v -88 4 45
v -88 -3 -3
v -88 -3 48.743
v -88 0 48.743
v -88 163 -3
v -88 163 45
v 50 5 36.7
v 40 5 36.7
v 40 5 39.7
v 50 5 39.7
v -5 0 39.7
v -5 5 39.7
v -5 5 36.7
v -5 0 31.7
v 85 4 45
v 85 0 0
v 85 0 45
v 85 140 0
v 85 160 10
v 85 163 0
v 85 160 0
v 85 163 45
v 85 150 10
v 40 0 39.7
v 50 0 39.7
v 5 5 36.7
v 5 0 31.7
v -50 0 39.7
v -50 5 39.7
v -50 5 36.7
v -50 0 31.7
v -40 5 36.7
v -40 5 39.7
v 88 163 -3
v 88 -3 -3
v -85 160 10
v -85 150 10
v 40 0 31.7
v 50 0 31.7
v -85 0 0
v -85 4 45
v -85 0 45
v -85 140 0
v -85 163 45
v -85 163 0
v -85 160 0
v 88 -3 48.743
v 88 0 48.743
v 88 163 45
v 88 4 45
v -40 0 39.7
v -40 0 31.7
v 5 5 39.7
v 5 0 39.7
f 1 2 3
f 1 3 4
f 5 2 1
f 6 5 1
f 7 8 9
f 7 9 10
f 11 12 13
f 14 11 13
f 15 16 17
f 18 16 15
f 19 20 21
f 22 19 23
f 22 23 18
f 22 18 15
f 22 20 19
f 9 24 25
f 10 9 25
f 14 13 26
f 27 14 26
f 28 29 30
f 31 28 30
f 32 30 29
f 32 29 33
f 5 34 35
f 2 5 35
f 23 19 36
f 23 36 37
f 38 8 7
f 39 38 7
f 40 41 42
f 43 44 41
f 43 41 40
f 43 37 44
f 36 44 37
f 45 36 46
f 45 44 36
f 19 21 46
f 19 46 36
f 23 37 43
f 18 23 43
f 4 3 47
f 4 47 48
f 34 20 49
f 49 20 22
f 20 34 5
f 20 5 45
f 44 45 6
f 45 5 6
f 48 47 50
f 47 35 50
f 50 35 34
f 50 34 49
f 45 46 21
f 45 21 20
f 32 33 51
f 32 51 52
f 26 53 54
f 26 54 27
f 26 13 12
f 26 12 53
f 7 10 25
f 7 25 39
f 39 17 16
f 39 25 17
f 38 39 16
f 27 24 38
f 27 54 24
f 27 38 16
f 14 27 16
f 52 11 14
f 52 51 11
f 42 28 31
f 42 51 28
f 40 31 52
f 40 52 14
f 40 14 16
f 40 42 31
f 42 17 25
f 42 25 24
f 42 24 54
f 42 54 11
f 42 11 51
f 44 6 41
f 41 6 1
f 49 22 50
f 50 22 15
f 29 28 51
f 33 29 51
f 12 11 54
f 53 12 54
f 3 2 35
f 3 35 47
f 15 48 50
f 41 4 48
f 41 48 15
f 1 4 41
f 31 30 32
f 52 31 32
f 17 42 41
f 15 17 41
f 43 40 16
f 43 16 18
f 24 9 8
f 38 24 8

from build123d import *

# Parameters (mm, degrees)
BOSS_EXTRUDE1_DEPTH             = 85
BOSS_EXTRUDE1_DEPTH_BACK        = 85
BOSS_EXTRUDE2_START             = -85
SKETCH1_4_W                     = 45
SKETCH1_4_H                     = 163
BOSS_EXTRUDE2_DEPTH             = 3
BOSS_EXTRUDE3_START             = 85
SKETCH1_5_W                     = 45
SKETCH1_5_H                     = 163
BOSS_EXTRUDE3_DEPTH             = 3
BOSS_EXTRUDE4_REACH             = 192.625
BOSS_EXTRUDE4_DIRECTION_2_REACH = 192.625
SKETCH5_W                       = 10
SKETCH5_H                       = 3
BOSS_EXTRUDE7_DEPTH             = 5
BOSS_EXTRUDE8_DEPTH             = 88
BOSS_EXTRUDE8_DEPTH_BACK        = 88
CHAMFER1_SIZE                   = 5


with BuildPart() as part:
    # Sketch1 → Boss-Extrude1 (new, two sides: drawn at the far end of the back side and taken through both)
    with BuildSketch(Plane(origin=(0, 0, 0), x_dir=(0, 0, -1), z_dir=(1, 0, 0)).offset(-BOSS_EXTRUDE1_DEPTH_BACK)):
        Polygon((-45, -3), (-45, 0), (0, 0), (0, 163), (3, 163), (3, -3), align=None)
    extrude(amount=BOSS_EXTRUDE1_DEPTH + BOSS_EXTRUDE1_DEPTH_BACK)

    # Sketch1<4> → Boss-Extrude2 (add)
    with BuildSketch(Plane(origin=(0, 0, 0), x_dir=(0, 0, -1), z_dir=(1, 0, 0)).offset(BOSS_EXTRUDE2_START)):
        with Locations((-22.5, 81.5)):
            Rectangle(SKETCH1_4_W, SKETCH1_4_H)
        Polygon((-45, -3), (-45, 0), (0, 0), (0, 163), (3, 163), (3, -3), align=None)
    extrude(amount=-BOSS_EXTRUDE2_DEPTH)

    # Sketch1<5> → Boss-Extrude3 (add)
    with BuildSketch(Plane(origin=(0, 0, 0), x_dir=(0, 0, -1), z_dir=(1, 0, 0)).offset(BOSS_EXTRUDE3_START)):
        Polygon((-45, -3), (-45, 0), (0, 0), (0, 163), (3, 163), (3, -3), align=None)
        with Locations((-22.5, 81.5)):
            Rectangle(SKETCH1_5_W, SKETCH1_5_H)
    extrude(amount=BOSS_EXTRUDE3_DEPTH)

    # Sketch2 → Boss-Extrude4 (add, up to next)
    with BuildSketch(Plane(origin=(0, 0, 0), x_dir=(0, 0, -1), z_dir=(1, 0, 0)), mode=Mode.PRIVATE) as boss_extrude4_sk1:
        Polygon((-10, 160), (-10, 150), (0, 140), (0, 160), align=None)
    boss_extrude4_tool1 = extrude(boss_extrude4_sk1.sketch, amount=BOSS_EXTRUDE4_REACH, mode=Mode.PRIVATE) - part.part
    add(boss_extrude4_tool1.solids().sort_by_distance((0, 152.222222, 4.444444))[0])

    # Sketch2 → Boss-Extrude4 direction 2 (add, up to next)
    with BuildSketch(Plane(origin=(0, 0, 0), x_dir=(0, 0, -1), z_dir=(1, 0, 0)), mode=Mode.PRIVATE) as boss_extrude4_direction_2_sk1:
        Polygon((-10, 160), (-10, 150), (0, 140), (0, 160), align=None)
    boss_extrude4_direction_2_tool1 = extrude(boss_extrude4_direction_2_sk1.sketch, amount=-BOSS_EXTRUDE4_DIRECTION_2_REACH, mode=Mode.PRIVATE) - part.part
    add(boss_extrude4_direction_2_tool1.solids().sort_by_distance((0, 152.222222, 4.444444))[0])

    # Sketch5 → Boss-Extrude7 (add)
    with BuildSketch(Plane(origin=(0, 0, 0), x_dir=(1, 0, 0), z_dir=(0, 1, 0))):
        with Locations((-45, -38.2)):
            Rectangle(SKETCH5_W, SKETCH5_H)
        with Locations((45, -38.2)):
            Rectangle(SKETCH5_W, SKETCH5_H)
        with Locations((0, -38.2)):
            Rectangle(SKETCH5_W, SKETCH5_H)
    extrude(amount=BOSS_EXTRUDE7_DEPTH)

    # Sketch4 → Boss-Extrude8 (add, two sides: drawn at the far end of the back side and taken through both)
    with BuildSketch(Plane(origin=(0, 0, 0), x_dir=(0, 0, -1), z_dir=(1, 0, 0)).offset(-BOSS_EXTRUDE8_DEPTH_BACK)):
        Polygon((-45, -3), (-48.742573267, -3), (-48.742573267, 0), (-45, 4), (-45, 0), align=None)
    extrude(amount=BOSS_EXTRUDE8_DEPTH + BOSS_EXTRUDE8_DEPTH_BACK)

    # Chamfer1
    chamfer1_edges = [part.edges().sort_by_distance(p)[0] for p in [
        (0, 0, 36.7),
        (45, 0, 36.7),
        (-45, 0, 36.7),
    ]]
    chamfer(chamfer1_edges, length=CHAMFER1_SIZE - 0.0001)  # a hair under: the kernel refuses the full size


solid = part.part
